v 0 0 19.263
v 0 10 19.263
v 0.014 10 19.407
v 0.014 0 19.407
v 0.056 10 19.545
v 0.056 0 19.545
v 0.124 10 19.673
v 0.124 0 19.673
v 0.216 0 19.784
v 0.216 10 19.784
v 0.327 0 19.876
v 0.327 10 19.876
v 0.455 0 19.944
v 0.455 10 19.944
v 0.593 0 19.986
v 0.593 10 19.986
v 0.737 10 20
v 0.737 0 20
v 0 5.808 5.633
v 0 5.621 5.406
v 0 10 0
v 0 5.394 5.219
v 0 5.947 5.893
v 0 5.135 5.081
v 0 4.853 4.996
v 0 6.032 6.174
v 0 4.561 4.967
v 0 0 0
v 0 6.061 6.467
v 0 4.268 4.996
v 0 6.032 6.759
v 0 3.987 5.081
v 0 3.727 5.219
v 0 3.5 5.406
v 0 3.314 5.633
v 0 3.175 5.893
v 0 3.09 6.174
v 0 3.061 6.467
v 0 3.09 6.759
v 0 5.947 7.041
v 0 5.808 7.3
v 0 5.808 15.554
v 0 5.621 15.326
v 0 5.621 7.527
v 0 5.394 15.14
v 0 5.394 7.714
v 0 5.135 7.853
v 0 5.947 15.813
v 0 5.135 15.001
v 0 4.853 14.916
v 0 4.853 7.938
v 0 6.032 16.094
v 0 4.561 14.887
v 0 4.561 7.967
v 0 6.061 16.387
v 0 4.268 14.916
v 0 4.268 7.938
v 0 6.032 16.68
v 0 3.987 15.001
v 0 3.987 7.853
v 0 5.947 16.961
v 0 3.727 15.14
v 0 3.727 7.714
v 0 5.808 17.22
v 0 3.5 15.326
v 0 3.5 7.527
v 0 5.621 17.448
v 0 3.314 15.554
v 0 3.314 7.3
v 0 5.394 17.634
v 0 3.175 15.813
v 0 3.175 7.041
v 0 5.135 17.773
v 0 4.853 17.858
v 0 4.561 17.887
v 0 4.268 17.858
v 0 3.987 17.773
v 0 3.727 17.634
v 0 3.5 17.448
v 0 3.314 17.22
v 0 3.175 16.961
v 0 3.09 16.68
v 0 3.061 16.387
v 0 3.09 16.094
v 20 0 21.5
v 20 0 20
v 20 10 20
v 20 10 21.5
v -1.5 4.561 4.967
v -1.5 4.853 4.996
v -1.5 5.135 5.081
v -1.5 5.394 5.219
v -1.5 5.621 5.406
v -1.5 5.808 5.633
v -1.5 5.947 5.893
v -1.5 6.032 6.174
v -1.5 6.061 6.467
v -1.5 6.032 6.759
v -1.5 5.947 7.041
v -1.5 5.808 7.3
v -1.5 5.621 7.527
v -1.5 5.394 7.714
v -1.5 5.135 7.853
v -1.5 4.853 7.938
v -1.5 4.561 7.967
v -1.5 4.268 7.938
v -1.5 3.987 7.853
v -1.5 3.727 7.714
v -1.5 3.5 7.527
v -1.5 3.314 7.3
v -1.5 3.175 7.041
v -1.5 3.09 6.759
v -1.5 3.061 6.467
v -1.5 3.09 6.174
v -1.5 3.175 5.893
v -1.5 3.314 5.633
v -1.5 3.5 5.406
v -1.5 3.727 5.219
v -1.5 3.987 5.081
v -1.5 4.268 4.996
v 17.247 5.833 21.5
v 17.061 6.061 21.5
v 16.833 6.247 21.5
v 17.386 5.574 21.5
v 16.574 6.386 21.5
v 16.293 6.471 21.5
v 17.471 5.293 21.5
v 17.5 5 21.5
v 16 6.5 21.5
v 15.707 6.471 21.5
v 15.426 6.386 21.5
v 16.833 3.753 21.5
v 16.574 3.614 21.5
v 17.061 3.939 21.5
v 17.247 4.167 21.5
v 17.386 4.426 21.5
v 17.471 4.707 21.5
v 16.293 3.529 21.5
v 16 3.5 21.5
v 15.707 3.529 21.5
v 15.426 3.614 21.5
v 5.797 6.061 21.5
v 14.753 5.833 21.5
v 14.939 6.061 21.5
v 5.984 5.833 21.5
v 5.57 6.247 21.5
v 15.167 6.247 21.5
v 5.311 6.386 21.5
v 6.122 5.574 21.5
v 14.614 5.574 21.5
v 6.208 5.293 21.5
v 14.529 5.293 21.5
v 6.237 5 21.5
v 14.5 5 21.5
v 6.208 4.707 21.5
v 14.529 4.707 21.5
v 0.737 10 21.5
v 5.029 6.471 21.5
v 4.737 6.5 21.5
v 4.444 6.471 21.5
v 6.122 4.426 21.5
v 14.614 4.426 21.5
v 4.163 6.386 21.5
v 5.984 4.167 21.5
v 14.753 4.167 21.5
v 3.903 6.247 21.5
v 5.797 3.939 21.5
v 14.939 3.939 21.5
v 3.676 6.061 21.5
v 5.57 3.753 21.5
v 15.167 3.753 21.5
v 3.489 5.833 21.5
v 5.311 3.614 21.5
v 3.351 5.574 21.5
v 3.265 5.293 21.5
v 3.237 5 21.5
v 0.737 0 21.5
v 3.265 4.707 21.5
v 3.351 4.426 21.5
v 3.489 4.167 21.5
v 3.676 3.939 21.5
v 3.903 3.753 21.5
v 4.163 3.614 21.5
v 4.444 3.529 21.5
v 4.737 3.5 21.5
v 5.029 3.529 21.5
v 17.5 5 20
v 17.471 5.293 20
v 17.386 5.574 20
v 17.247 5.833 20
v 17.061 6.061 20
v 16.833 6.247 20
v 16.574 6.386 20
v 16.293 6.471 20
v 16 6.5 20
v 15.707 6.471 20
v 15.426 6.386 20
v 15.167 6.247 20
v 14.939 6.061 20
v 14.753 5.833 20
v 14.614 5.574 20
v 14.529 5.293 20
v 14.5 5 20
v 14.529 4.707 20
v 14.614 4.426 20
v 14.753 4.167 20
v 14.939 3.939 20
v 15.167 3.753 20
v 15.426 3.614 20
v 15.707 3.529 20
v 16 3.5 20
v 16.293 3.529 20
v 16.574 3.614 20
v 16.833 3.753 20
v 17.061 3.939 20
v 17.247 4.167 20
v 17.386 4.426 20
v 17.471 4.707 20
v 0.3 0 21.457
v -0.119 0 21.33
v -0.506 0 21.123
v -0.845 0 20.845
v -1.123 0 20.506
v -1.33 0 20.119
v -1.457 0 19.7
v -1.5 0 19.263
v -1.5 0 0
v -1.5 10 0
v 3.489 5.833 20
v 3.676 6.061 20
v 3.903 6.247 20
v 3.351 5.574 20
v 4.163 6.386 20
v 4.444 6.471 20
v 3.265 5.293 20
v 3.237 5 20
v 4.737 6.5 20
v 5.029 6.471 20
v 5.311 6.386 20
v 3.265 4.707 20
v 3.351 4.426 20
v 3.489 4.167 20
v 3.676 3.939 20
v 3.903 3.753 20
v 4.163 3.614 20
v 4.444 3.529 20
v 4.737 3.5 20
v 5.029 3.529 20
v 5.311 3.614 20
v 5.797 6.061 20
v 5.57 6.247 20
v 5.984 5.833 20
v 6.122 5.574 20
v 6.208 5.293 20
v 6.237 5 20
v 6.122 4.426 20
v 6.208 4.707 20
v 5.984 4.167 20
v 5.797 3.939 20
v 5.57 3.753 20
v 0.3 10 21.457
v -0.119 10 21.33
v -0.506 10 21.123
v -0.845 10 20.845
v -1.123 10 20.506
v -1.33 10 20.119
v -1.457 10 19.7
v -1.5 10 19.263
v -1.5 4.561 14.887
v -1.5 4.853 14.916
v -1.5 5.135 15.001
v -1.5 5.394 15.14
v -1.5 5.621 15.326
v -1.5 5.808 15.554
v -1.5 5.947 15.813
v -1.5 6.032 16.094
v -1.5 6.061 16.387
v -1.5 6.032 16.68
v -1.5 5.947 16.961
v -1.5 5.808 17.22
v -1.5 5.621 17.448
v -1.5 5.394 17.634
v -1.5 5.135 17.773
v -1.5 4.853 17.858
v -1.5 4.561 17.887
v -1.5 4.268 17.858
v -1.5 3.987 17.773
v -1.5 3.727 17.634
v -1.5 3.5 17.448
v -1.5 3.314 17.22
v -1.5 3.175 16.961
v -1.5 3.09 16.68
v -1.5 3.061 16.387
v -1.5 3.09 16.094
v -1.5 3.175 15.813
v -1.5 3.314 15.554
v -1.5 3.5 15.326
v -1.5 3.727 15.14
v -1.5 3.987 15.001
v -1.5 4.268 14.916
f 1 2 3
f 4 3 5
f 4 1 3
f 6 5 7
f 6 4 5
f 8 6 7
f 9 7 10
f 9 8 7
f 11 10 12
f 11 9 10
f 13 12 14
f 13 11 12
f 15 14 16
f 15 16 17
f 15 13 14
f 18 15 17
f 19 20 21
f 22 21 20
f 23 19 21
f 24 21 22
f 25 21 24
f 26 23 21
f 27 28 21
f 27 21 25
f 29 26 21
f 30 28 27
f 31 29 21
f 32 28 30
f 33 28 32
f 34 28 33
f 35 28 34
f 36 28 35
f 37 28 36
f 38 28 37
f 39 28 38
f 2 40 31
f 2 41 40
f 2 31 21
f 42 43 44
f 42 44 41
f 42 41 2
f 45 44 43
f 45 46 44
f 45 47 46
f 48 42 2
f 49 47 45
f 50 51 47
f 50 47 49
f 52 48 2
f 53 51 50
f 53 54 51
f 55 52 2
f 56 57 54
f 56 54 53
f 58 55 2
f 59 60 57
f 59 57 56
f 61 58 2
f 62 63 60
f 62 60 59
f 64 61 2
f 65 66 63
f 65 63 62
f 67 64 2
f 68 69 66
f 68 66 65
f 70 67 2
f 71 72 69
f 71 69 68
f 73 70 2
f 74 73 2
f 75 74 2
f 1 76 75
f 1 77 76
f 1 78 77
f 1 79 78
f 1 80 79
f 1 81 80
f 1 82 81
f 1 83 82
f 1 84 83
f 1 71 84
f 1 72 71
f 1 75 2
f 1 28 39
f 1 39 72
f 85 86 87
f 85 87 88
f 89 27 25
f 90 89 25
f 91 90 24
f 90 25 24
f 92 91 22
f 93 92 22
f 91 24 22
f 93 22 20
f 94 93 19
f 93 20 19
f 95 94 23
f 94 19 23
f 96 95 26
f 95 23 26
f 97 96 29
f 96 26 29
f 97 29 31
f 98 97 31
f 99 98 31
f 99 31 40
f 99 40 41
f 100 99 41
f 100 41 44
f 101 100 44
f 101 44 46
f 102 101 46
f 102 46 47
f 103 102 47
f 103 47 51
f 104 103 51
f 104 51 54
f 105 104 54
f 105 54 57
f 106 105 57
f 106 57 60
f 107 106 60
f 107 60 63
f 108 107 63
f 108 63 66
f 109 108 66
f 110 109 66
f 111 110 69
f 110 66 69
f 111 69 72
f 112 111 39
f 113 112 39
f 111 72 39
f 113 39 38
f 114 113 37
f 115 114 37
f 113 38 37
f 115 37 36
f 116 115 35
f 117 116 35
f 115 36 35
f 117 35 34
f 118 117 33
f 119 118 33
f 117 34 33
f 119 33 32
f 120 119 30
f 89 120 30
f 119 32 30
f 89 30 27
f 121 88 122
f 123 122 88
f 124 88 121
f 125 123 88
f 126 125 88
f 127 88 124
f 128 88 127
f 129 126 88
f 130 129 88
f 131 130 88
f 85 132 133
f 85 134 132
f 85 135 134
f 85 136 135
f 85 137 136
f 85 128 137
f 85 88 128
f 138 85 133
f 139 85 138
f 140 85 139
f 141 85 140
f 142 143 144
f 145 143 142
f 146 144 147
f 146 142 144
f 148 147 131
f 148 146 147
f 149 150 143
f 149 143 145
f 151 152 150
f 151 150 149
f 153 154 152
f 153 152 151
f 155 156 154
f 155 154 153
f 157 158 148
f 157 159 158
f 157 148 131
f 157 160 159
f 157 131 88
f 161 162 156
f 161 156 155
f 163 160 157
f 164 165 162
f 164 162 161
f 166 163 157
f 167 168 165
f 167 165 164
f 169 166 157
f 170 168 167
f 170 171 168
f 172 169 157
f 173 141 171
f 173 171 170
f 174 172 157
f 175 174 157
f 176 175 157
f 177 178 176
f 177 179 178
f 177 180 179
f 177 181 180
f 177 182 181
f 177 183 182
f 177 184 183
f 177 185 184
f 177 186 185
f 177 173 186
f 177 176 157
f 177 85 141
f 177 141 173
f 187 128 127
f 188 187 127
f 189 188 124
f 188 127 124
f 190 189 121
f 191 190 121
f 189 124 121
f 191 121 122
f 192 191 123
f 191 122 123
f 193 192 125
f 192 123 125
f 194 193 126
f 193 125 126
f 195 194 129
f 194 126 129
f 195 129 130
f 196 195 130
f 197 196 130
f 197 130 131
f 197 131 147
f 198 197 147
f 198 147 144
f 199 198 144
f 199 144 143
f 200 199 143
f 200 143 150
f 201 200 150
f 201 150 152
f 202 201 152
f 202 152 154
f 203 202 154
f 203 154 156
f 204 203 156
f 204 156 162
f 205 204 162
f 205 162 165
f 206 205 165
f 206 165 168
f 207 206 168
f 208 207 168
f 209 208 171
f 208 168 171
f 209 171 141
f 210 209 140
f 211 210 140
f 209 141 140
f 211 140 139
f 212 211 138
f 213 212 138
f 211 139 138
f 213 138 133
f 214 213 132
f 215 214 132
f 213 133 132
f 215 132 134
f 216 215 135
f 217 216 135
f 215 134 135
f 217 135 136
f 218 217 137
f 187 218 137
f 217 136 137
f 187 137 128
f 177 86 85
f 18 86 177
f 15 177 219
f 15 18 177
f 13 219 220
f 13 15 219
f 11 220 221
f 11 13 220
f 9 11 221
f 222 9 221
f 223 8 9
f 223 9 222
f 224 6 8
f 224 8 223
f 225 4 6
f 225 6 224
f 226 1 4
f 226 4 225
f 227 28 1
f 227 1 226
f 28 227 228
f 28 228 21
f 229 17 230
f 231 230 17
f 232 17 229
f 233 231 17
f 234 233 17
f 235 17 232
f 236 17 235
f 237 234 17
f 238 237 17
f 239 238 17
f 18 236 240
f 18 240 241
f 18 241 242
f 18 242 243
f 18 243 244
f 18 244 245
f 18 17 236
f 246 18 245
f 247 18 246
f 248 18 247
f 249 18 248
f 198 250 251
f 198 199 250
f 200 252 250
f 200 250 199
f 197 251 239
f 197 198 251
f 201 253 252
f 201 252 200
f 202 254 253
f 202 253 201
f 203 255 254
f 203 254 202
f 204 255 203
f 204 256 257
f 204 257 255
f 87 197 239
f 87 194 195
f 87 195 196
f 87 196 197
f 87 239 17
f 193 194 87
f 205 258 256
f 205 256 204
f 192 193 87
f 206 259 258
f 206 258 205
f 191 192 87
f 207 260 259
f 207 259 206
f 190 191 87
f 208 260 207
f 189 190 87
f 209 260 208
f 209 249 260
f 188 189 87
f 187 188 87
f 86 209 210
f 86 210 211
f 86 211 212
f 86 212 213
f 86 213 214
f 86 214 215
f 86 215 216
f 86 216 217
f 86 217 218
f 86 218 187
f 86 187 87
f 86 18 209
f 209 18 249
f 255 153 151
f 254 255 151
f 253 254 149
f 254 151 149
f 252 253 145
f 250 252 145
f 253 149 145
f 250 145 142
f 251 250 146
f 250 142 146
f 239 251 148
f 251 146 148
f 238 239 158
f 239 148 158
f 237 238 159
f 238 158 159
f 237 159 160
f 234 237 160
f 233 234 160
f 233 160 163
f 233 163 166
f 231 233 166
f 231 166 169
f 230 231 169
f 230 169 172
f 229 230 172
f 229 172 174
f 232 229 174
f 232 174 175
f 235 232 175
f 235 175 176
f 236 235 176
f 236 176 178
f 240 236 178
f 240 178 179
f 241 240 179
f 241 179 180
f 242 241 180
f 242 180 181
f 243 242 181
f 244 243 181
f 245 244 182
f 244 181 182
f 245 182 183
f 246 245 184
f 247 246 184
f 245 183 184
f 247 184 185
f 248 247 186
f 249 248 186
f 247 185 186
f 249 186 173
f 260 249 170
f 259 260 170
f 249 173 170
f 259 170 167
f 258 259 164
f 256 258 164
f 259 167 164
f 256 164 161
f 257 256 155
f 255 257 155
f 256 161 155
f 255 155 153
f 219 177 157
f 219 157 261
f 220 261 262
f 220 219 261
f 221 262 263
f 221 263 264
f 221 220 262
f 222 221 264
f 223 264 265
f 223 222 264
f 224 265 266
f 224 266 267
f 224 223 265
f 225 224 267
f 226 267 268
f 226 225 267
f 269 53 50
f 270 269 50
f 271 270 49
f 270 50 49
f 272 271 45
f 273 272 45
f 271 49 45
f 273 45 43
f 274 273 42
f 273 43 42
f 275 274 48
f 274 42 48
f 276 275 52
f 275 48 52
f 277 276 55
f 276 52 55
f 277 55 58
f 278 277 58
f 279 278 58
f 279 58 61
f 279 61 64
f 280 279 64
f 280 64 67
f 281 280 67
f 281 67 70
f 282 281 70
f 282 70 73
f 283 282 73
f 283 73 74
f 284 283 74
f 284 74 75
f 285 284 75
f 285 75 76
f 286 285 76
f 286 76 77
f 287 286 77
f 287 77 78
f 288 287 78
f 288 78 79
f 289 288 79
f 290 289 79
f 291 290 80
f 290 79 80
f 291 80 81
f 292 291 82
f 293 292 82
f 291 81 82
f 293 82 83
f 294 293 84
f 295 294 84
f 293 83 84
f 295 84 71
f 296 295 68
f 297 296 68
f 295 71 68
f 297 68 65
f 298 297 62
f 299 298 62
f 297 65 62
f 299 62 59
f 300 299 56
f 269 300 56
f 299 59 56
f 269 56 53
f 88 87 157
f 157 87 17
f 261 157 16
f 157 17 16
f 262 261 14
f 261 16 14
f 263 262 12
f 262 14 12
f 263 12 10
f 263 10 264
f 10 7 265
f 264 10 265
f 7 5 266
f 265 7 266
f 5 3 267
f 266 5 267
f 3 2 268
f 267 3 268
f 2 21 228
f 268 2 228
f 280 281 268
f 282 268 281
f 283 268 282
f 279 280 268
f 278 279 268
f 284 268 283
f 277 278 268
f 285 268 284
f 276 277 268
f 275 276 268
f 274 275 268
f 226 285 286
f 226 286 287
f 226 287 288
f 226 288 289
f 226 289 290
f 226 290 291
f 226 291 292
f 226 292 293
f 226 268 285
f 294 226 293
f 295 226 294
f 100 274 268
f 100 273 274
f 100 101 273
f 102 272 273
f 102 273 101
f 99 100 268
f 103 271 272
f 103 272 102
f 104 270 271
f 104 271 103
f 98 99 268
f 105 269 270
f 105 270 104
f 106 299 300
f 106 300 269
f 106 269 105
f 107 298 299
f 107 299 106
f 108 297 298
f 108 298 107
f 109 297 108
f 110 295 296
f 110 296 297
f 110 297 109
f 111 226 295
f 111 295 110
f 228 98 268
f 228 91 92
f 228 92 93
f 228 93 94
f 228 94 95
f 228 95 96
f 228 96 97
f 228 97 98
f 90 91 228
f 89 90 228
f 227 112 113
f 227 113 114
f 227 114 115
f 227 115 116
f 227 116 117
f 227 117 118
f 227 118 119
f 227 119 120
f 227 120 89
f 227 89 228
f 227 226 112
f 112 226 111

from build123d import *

# Parameters (mm, degrees)
BASE_FLANGE1_DEPTH                 = 10
F_3_0MM_TRANSITIONAL_DOWEL_HOLE1_D = 3
F_3_0MM_PRESS_DOWEL_HOLE1_D        = 3


# Sheet-metal steps are written as plain solids
with BuildPart() as part:
    # Sketch1 → Base-Flange1 (new body)
    with BuildSketch(Plane(origin=(0, 0, 0), x_dir=(1, 0, 0), z_dir=(0, 1, 0))):
        with BuildLine():
            Line((0, 0), (0, -19.2634))
            ThreePointArc((0, -19.2634), (0.215745145, -19.784254855), (0.7366, -20))
            Line((0.7366, -20), (20, -20))
            Line((20, -20), (20, -21.5))
            Line((20, -21.5), (0.7366, -21.5))
            ThreePointArc((0.7366, -21.5), (-0.844915027, -20.844915027), (-1.5, -19.2634))
            Line((-1.5, -19.2634), (-1.5, 0))
            Line((-1.5, 0), (0, 0))
        make_face()
    extrude(amount=BASE_FLANGE1_DEPTH)

    # Ø3.0mm Transitional Dowel Hole1 (through all)
    with Locations(Plane.ZY.offset(1.5)):
        with Locations((16.387023366, 4.560762846), (6.466703516, 4.560762846)):
            Hole(F_3_0MM_TRANSITIONAL_DOWEL_HOLE1_D / 2)

    # Ø3.0mm Press Dowel Hole1 (through all)
    with Locations(Plane(origin=(0, 0, 20), x_dir=(-1, 0, 0), z_dir=(0, 0, -1))):
        with Locations((-4.7366, 5), (-16, 5)):
            Hole(F_3_0MM_PRESS_DOWEL_HOLE1_D / 2)


solid = part.part
